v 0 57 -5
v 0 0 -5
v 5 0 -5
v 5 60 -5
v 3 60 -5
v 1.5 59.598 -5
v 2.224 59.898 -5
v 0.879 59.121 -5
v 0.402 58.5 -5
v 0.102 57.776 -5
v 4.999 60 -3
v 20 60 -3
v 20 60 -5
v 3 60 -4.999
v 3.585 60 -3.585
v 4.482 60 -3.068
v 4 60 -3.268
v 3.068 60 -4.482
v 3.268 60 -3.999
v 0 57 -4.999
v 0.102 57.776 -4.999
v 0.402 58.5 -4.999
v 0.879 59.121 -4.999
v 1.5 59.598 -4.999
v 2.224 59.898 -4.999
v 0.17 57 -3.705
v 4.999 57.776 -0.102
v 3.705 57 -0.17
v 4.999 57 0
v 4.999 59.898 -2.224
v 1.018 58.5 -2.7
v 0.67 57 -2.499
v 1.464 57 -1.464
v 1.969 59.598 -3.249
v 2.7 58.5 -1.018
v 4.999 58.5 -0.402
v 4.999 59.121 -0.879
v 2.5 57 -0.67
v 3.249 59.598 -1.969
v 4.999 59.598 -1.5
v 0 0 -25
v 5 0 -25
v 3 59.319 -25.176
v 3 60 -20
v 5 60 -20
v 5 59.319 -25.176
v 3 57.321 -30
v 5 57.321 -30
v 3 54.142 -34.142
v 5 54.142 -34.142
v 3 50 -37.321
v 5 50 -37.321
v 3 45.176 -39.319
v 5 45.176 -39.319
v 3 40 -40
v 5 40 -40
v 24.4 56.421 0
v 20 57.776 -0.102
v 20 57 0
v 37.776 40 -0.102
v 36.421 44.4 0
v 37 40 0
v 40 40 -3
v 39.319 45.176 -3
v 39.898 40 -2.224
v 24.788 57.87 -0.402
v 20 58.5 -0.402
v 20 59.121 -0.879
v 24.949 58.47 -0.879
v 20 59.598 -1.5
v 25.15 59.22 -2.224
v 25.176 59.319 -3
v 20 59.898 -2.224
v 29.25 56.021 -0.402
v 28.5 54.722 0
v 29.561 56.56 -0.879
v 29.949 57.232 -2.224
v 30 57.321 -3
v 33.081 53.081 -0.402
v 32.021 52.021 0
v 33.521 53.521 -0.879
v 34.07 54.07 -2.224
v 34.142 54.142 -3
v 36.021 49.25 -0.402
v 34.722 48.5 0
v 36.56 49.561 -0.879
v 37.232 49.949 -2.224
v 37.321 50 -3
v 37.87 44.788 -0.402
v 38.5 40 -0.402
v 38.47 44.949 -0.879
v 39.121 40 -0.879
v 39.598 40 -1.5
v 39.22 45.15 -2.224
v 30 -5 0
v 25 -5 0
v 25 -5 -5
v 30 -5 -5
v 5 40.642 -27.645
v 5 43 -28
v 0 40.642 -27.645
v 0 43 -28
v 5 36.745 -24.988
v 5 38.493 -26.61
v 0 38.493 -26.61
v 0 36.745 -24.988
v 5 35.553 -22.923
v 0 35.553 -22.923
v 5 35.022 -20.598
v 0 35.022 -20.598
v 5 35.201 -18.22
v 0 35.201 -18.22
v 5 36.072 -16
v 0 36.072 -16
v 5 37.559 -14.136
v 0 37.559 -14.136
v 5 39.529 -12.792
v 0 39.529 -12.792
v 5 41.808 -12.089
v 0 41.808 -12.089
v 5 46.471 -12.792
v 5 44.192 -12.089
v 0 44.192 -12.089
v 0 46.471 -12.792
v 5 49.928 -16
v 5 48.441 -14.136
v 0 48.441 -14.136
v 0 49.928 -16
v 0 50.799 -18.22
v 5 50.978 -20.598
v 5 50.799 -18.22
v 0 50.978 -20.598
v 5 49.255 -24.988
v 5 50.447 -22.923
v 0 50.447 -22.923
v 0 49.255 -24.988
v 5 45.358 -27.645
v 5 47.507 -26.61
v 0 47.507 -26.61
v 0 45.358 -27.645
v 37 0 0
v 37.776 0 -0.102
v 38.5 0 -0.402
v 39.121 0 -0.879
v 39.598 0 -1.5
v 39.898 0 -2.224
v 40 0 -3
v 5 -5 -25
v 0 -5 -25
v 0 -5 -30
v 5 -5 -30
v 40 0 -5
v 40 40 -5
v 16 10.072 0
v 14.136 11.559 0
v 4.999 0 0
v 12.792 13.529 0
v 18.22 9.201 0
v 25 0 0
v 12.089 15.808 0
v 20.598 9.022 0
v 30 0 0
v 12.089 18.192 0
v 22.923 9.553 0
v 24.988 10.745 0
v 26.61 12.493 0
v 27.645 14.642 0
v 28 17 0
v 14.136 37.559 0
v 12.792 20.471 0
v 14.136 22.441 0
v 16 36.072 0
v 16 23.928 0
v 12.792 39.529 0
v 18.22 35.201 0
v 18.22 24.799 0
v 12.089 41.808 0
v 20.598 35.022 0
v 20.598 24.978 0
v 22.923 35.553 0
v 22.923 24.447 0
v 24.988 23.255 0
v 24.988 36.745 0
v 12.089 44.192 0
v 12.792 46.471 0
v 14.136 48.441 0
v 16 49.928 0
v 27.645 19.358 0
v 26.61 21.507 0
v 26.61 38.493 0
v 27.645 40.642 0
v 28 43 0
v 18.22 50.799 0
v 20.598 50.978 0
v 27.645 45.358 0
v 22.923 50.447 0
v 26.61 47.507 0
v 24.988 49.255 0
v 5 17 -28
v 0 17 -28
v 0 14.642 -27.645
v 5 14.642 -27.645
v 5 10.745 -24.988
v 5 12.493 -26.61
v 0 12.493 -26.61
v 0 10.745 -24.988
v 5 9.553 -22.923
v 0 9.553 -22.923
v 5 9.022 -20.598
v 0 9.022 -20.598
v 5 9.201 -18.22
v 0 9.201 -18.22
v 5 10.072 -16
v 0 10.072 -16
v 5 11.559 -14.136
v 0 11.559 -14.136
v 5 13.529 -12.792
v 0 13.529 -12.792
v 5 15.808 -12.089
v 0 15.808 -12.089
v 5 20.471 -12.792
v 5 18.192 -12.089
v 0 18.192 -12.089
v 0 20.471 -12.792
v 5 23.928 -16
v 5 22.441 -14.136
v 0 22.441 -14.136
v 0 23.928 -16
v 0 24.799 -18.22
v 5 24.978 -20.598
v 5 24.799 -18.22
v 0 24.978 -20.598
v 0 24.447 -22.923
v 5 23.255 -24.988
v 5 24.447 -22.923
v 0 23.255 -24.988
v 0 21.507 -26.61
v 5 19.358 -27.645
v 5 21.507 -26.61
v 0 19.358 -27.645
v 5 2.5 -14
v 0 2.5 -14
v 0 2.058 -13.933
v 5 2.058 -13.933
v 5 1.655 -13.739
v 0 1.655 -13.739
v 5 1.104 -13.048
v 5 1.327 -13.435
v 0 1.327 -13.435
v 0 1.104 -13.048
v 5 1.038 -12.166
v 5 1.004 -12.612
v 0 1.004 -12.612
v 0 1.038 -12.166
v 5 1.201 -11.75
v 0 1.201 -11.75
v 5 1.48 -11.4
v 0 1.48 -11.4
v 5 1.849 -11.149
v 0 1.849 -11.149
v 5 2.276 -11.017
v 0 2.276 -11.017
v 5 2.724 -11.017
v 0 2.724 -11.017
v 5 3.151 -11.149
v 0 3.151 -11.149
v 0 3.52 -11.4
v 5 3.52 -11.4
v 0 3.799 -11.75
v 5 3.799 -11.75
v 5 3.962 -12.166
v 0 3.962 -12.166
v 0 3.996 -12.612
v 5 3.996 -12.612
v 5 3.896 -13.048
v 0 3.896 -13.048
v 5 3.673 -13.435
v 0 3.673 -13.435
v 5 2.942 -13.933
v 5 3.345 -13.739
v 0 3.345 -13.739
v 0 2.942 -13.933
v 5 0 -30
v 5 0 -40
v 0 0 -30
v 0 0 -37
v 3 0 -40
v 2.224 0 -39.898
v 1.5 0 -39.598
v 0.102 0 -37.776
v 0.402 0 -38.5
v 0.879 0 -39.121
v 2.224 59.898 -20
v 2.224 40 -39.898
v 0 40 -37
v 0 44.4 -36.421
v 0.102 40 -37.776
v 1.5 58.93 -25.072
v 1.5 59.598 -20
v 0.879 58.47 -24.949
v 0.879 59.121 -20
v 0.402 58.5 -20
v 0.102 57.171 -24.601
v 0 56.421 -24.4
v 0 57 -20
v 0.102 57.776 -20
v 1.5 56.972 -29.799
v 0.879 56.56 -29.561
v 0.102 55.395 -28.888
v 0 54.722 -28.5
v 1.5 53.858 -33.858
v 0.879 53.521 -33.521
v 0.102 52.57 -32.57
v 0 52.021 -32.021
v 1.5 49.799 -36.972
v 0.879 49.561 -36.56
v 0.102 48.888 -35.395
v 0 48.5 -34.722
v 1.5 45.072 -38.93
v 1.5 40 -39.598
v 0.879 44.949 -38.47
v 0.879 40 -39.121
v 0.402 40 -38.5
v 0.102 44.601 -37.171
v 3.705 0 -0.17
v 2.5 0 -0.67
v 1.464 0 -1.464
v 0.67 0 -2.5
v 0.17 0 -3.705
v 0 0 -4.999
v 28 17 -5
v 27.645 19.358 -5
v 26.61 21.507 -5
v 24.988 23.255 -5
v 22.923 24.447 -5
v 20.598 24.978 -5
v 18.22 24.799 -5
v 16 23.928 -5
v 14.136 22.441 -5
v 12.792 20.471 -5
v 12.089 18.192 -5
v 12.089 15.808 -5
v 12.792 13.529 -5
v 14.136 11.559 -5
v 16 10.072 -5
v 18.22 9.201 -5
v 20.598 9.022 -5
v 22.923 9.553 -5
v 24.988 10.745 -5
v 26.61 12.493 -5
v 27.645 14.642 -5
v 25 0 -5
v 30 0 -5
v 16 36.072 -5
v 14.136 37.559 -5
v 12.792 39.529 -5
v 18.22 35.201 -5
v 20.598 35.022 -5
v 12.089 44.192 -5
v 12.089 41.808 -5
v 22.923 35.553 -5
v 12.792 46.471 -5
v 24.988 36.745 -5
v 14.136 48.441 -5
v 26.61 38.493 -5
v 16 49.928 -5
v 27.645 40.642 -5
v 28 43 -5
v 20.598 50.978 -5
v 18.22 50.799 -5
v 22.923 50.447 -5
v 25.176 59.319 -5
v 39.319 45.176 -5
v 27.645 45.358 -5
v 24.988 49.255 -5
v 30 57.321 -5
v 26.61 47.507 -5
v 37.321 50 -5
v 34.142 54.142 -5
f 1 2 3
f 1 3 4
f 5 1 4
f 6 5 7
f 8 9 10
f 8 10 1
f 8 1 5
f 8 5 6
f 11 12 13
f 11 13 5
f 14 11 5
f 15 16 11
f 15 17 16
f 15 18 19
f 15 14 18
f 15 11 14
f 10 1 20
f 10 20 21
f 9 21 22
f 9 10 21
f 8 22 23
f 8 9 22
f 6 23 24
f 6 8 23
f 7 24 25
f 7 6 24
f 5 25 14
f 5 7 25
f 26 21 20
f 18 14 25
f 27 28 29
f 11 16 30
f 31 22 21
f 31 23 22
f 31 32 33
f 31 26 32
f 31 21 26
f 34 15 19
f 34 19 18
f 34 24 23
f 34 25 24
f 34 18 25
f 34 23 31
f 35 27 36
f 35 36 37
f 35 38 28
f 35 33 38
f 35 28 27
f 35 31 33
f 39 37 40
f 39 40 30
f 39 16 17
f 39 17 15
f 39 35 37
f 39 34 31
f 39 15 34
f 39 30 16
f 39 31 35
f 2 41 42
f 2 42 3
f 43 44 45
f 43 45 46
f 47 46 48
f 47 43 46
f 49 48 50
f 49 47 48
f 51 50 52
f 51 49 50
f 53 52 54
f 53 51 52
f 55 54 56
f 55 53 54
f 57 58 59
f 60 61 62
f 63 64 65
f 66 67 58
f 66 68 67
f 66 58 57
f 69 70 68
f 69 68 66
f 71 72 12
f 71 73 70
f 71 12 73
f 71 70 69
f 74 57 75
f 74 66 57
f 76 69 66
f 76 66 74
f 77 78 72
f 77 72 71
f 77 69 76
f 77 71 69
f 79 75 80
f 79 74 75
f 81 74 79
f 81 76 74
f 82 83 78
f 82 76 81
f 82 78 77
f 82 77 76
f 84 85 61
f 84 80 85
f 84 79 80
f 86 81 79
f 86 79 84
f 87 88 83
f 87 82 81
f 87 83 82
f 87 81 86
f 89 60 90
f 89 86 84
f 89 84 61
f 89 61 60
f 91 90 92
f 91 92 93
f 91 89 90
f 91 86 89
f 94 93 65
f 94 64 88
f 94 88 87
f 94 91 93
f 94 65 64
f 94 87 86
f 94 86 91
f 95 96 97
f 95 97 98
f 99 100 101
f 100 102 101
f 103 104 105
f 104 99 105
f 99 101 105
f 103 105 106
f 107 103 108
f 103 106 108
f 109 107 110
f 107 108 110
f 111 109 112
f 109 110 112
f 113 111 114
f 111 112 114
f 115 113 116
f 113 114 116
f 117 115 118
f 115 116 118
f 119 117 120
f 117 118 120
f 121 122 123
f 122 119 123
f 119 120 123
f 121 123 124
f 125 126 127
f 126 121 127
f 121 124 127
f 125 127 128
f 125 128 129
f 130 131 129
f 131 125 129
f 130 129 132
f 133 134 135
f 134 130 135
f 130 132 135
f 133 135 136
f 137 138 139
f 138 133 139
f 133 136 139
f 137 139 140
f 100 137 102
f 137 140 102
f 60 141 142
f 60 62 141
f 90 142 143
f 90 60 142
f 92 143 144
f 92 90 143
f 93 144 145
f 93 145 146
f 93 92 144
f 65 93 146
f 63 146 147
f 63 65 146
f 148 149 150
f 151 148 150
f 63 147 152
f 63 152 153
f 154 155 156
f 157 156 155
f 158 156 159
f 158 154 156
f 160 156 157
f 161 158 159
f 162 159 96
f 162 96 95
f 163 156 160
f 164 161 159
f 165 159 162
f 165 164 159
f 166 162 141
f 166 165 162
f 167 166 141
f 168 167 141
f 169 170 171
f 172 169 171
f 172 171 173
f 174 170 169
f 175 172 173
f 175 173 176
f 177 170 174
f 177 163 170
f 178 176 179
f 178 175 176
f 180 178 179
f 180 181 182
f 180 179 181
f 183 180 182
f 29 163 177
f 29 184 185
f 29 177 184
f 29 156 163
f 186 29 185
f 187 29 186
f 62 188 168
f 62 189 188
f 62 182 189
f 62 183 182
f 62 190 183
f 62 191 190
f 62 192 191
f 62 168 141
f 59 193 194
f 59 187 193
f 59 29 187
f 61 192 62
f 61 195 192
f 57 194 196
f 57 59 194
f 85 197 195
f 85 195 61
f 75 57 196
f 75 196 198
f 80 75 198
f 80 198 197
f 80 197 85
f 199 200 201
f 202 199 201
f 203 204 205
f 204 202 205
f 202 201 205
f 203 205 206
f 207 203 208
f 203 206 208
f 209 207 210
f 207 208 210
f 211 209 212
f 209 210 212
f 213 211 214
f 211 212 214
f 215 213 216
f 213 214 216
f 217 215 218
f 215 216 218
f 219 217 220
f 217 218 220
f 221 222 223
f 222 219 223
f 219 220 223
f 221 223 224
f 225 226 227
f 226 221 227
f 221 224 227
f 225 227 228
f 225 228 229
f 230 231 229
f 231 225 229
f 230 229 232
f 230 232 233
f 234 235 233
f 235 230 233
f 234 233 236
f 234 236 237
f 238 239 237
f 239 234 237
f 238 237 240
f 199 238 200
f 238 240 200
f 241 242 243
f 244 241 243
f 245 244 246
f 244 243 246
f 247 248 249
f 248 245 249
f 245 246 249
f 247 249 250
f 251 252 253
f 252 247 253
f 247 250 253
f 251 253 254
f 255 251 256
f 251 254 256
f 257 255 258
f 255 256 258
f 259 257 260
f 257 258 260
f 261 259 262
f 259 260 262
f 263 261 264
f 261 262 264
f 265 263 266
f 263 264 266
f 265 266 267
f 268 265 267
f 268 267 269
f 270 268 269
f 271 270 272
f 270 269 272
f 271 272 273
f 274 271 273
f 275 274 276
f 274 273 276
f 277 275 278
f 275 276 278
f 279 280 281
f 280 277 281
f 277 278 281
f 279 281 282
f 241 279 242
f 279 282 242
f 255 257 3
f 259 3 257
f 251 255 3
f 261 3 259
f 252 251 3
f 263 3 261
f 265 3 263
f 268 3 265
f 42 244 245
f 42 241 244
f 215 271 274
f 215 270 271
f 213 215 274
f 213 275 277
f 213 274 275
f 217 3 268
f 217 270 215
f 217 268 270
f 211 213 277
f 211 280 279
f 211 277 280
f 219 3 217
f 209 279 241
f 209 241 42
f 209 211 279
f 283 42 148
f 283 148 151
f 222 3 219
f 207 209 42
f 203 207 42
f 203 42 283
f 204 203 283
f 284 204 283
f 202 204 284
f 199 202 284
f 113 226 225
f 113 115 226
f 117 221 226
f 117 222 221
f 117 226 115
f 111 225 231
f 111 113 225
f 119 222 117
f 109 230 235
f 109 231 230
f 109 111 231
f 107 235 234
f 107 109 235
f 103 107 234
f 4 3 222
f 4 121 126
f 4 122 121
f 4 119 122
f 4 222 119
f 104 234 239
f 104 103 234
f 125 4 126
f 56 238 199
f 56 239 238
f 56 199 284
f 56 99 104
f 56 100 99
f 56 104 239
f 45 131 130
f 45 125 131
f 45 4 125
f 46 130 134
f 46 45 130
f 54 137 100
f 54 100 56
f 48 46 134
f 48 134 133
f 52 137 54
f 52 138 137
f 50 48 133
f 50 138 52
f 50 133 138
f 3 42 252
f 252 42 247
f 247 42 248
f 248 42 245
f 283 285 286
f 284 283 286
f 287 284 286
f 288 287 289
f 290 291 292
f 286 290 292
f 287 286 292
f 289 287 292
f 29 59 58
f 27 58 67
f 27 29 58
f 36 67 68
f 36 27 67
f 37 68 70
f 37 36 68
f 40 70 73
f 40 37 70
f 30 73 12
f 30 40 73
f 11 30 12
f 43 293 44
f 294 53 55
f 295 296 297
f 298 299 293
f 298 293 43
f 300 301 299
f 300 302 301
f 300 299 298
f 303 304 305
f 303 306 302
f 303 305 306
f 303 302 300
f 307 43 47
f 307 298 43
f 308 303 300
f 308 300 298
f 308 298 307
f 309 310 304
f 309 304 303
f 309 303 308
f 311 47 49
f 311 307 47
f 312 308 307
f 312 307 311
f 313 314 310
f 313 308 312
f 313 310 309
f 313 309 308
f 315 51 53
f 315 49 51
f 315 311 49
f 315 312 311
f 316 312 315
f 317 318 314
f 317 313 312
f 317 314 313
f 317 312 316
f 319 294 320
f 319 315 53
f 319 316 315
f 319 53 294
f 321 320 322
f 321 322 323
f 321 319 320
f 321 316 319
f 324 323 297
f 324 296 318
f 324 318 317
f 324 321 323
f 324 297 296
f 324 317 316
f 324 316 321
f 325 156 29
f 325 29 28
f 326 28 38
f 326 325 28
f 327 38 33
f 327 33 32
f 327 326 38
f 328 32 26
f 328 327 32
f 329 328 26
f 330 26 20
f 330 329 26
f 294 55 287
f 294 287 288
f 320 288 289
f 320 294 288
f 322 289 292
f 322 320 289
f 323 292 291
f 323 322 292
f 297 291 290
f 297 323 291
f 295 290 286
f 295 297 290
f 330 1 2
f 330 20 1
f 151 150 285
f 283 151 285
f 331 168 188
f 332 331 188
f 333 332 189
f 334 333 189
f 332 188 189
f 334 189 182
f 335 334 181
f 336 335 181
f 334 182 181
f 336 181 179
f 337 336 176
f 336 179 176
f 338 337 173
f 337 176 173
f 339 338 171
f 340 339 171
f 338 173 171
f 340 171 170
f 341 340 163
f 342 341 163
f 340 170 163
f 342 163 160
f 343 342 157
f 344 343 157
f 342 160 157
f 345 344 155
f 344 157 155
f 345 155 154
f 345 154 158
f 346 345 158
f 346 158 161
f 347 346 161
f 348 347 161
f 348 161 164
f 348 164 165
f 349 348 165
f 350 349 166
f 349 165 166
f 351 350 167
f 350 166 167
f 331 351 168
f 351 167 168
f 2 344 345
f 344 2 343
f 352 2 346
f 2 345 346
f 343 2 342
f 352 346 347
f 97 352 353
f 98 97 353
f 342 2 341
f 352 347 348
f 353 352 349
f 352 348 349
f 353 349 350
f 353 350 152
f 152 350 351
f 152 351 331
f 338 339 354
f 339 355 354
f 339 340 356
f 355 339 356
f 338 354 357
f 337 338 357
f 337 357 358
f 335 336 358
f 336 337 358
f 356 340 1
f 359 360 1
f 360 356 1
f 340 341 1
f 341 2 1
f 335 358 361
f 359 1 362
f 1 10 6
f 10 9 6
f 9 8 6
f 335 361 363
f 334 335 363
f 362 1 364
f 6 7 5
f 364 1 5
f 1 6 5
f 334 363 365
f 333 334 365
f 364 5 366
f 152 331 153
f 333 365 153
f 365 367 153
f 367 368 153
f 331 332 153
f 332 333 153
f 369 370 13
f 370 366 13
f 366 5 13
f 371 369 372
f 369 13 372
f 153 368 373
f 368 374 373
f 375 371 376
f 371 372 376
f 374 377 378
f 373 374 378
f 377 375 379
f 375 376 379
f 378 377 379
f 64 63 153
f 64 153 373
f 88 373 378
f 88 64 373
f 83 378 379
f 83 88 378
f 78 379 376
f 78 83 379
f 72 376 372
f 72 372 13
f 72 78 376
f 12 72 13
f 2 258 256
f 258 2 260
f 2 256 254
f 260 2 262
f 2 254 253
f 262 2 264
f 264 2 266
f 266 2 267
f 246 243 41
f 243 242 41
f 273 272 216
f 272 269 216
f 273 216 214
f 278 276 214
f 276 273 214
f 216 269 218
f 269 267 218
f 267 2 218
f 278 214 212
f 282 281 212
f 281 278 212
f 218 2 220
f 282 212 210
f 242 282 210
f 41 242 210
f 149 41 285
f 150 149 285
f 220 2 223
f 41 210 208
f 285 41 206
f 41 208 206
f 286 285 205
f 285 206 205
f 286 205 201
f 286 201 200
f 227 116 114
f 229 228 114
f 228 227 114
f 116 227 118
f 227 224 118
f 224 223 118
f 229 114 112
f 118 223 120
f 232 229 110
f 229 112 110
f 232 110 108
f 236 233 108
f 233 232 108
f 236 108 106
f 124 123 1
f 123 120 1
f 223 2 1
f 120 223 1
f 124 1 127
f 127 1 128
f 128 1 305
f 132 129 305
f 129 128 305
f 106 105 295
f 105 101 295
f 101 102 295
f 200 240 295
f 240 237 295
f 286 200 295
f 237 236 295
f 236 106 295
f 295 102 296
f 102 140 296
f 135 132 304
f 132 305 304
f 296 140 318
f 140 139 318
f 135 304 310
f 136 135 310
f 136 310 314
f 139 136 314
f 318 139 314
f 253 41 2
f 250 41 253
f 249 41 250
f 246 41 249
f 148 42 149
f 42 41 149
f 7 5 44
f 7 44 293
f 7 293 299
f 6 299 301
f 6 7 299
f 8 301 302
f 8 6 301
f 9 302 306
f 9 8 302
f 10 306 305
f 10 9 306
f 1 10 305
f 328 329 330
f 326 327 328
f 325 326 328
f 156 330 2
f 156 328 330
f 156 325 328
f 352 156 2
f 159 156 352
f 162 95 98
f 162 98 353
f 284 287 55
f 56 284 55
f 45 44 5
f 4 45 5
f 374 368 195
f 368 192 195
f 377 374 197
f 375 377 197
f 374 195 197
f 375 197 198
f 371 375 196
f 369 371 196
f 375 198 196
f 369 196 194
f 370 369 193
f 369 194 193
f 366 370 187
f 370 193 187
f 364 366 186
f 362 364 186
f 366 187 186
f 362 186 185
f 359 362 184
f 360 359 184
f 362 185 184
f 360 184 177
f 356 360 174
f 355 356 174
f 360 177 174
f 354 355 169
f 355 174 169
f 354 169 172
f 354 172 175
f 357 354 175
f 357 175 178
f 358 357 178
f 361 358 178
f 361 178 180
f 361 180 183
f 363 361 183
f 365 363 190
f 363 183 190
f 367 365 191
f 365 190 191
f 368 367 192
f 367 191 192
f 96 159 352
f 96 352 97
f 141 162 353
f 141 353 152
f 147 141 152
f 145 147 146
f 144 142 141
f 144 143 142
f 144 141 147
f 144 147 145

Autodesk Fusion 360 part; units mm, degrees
sketch "Sketch5" plane through (0, 0, 0) normal (1, 0, 0) x (0, 0, -1)
  line L0 (25, 0) -> (25, -5)
  line L1 (25, -5) -> (30, -5)
  line L2 (30, -5) -> (30, 0)
  line L3 (30, 0) -> (35, 0)
  line L4 (35, 0) -> (40, 0)
  circle A0 centre (12.5, 2.5) radius 1.5
  circle A1 centre (20, 43) radius 8
  circle A2 centre (20, 17) radius 8
  line L5 (40, 0) -> (40, 40)
  line L6 (20, 60) -> (5, 60)
  arc A3 (40, 40) -> (20, 60) centre (20, 40) ccw
  line L7 (5, 0) -> (5, 60)
  line L8 (25, 0) -> (5, 0)
  dimension "d18" = 3
  dimension "d19" = 20
extrude "Extrude6" add sketch "Sketch5" along normal blind 5 makes body 1
sketch "Sketch6" plane through (0, 0, 0) normal (0, 0, 1) x (1, 0, 0)
  line L0 (25, -5) -> (30, -5)
  line L1 (0, 60) -> (0, 0)
  line L2 (30, 0) -> (35, 0)
  arc A0 (40, 40) -> (20, 60) centre (20, 40) ccw
  line L3 (20, 60) -> (0, 60)
  line L4 (35, 0) -> (40, 0)
  circle A1 centre (20, 43) radius 8
  line L5 (0, 0) -> (25, 0)
  line L6 (25, 0) -> (25, -5)
  line L7 (30, -5) -> (30, 0)
  circle A2 centre (20, 17) radius 8
  line L8 (40, 0) -> (40, 40)
  dimension "d21" = 20
extrude "Extrude5" add sketch "Sketch6" against normal blind 5 separate body makes body 2
fillet "Fillet1" radius 5 1 edges at (0, 30, 0) on bodies 2
fillet "Fillet2" radius 3 7 edges at (40, 20, 0) (34.1421, 54.1421, 0) (12.5, 60, 0) (1.4645, 60, -1.4645) (0, 20, -40) (0, 54.1421, -34.1421) (0, 60, -12.5) on bodies 1 2
